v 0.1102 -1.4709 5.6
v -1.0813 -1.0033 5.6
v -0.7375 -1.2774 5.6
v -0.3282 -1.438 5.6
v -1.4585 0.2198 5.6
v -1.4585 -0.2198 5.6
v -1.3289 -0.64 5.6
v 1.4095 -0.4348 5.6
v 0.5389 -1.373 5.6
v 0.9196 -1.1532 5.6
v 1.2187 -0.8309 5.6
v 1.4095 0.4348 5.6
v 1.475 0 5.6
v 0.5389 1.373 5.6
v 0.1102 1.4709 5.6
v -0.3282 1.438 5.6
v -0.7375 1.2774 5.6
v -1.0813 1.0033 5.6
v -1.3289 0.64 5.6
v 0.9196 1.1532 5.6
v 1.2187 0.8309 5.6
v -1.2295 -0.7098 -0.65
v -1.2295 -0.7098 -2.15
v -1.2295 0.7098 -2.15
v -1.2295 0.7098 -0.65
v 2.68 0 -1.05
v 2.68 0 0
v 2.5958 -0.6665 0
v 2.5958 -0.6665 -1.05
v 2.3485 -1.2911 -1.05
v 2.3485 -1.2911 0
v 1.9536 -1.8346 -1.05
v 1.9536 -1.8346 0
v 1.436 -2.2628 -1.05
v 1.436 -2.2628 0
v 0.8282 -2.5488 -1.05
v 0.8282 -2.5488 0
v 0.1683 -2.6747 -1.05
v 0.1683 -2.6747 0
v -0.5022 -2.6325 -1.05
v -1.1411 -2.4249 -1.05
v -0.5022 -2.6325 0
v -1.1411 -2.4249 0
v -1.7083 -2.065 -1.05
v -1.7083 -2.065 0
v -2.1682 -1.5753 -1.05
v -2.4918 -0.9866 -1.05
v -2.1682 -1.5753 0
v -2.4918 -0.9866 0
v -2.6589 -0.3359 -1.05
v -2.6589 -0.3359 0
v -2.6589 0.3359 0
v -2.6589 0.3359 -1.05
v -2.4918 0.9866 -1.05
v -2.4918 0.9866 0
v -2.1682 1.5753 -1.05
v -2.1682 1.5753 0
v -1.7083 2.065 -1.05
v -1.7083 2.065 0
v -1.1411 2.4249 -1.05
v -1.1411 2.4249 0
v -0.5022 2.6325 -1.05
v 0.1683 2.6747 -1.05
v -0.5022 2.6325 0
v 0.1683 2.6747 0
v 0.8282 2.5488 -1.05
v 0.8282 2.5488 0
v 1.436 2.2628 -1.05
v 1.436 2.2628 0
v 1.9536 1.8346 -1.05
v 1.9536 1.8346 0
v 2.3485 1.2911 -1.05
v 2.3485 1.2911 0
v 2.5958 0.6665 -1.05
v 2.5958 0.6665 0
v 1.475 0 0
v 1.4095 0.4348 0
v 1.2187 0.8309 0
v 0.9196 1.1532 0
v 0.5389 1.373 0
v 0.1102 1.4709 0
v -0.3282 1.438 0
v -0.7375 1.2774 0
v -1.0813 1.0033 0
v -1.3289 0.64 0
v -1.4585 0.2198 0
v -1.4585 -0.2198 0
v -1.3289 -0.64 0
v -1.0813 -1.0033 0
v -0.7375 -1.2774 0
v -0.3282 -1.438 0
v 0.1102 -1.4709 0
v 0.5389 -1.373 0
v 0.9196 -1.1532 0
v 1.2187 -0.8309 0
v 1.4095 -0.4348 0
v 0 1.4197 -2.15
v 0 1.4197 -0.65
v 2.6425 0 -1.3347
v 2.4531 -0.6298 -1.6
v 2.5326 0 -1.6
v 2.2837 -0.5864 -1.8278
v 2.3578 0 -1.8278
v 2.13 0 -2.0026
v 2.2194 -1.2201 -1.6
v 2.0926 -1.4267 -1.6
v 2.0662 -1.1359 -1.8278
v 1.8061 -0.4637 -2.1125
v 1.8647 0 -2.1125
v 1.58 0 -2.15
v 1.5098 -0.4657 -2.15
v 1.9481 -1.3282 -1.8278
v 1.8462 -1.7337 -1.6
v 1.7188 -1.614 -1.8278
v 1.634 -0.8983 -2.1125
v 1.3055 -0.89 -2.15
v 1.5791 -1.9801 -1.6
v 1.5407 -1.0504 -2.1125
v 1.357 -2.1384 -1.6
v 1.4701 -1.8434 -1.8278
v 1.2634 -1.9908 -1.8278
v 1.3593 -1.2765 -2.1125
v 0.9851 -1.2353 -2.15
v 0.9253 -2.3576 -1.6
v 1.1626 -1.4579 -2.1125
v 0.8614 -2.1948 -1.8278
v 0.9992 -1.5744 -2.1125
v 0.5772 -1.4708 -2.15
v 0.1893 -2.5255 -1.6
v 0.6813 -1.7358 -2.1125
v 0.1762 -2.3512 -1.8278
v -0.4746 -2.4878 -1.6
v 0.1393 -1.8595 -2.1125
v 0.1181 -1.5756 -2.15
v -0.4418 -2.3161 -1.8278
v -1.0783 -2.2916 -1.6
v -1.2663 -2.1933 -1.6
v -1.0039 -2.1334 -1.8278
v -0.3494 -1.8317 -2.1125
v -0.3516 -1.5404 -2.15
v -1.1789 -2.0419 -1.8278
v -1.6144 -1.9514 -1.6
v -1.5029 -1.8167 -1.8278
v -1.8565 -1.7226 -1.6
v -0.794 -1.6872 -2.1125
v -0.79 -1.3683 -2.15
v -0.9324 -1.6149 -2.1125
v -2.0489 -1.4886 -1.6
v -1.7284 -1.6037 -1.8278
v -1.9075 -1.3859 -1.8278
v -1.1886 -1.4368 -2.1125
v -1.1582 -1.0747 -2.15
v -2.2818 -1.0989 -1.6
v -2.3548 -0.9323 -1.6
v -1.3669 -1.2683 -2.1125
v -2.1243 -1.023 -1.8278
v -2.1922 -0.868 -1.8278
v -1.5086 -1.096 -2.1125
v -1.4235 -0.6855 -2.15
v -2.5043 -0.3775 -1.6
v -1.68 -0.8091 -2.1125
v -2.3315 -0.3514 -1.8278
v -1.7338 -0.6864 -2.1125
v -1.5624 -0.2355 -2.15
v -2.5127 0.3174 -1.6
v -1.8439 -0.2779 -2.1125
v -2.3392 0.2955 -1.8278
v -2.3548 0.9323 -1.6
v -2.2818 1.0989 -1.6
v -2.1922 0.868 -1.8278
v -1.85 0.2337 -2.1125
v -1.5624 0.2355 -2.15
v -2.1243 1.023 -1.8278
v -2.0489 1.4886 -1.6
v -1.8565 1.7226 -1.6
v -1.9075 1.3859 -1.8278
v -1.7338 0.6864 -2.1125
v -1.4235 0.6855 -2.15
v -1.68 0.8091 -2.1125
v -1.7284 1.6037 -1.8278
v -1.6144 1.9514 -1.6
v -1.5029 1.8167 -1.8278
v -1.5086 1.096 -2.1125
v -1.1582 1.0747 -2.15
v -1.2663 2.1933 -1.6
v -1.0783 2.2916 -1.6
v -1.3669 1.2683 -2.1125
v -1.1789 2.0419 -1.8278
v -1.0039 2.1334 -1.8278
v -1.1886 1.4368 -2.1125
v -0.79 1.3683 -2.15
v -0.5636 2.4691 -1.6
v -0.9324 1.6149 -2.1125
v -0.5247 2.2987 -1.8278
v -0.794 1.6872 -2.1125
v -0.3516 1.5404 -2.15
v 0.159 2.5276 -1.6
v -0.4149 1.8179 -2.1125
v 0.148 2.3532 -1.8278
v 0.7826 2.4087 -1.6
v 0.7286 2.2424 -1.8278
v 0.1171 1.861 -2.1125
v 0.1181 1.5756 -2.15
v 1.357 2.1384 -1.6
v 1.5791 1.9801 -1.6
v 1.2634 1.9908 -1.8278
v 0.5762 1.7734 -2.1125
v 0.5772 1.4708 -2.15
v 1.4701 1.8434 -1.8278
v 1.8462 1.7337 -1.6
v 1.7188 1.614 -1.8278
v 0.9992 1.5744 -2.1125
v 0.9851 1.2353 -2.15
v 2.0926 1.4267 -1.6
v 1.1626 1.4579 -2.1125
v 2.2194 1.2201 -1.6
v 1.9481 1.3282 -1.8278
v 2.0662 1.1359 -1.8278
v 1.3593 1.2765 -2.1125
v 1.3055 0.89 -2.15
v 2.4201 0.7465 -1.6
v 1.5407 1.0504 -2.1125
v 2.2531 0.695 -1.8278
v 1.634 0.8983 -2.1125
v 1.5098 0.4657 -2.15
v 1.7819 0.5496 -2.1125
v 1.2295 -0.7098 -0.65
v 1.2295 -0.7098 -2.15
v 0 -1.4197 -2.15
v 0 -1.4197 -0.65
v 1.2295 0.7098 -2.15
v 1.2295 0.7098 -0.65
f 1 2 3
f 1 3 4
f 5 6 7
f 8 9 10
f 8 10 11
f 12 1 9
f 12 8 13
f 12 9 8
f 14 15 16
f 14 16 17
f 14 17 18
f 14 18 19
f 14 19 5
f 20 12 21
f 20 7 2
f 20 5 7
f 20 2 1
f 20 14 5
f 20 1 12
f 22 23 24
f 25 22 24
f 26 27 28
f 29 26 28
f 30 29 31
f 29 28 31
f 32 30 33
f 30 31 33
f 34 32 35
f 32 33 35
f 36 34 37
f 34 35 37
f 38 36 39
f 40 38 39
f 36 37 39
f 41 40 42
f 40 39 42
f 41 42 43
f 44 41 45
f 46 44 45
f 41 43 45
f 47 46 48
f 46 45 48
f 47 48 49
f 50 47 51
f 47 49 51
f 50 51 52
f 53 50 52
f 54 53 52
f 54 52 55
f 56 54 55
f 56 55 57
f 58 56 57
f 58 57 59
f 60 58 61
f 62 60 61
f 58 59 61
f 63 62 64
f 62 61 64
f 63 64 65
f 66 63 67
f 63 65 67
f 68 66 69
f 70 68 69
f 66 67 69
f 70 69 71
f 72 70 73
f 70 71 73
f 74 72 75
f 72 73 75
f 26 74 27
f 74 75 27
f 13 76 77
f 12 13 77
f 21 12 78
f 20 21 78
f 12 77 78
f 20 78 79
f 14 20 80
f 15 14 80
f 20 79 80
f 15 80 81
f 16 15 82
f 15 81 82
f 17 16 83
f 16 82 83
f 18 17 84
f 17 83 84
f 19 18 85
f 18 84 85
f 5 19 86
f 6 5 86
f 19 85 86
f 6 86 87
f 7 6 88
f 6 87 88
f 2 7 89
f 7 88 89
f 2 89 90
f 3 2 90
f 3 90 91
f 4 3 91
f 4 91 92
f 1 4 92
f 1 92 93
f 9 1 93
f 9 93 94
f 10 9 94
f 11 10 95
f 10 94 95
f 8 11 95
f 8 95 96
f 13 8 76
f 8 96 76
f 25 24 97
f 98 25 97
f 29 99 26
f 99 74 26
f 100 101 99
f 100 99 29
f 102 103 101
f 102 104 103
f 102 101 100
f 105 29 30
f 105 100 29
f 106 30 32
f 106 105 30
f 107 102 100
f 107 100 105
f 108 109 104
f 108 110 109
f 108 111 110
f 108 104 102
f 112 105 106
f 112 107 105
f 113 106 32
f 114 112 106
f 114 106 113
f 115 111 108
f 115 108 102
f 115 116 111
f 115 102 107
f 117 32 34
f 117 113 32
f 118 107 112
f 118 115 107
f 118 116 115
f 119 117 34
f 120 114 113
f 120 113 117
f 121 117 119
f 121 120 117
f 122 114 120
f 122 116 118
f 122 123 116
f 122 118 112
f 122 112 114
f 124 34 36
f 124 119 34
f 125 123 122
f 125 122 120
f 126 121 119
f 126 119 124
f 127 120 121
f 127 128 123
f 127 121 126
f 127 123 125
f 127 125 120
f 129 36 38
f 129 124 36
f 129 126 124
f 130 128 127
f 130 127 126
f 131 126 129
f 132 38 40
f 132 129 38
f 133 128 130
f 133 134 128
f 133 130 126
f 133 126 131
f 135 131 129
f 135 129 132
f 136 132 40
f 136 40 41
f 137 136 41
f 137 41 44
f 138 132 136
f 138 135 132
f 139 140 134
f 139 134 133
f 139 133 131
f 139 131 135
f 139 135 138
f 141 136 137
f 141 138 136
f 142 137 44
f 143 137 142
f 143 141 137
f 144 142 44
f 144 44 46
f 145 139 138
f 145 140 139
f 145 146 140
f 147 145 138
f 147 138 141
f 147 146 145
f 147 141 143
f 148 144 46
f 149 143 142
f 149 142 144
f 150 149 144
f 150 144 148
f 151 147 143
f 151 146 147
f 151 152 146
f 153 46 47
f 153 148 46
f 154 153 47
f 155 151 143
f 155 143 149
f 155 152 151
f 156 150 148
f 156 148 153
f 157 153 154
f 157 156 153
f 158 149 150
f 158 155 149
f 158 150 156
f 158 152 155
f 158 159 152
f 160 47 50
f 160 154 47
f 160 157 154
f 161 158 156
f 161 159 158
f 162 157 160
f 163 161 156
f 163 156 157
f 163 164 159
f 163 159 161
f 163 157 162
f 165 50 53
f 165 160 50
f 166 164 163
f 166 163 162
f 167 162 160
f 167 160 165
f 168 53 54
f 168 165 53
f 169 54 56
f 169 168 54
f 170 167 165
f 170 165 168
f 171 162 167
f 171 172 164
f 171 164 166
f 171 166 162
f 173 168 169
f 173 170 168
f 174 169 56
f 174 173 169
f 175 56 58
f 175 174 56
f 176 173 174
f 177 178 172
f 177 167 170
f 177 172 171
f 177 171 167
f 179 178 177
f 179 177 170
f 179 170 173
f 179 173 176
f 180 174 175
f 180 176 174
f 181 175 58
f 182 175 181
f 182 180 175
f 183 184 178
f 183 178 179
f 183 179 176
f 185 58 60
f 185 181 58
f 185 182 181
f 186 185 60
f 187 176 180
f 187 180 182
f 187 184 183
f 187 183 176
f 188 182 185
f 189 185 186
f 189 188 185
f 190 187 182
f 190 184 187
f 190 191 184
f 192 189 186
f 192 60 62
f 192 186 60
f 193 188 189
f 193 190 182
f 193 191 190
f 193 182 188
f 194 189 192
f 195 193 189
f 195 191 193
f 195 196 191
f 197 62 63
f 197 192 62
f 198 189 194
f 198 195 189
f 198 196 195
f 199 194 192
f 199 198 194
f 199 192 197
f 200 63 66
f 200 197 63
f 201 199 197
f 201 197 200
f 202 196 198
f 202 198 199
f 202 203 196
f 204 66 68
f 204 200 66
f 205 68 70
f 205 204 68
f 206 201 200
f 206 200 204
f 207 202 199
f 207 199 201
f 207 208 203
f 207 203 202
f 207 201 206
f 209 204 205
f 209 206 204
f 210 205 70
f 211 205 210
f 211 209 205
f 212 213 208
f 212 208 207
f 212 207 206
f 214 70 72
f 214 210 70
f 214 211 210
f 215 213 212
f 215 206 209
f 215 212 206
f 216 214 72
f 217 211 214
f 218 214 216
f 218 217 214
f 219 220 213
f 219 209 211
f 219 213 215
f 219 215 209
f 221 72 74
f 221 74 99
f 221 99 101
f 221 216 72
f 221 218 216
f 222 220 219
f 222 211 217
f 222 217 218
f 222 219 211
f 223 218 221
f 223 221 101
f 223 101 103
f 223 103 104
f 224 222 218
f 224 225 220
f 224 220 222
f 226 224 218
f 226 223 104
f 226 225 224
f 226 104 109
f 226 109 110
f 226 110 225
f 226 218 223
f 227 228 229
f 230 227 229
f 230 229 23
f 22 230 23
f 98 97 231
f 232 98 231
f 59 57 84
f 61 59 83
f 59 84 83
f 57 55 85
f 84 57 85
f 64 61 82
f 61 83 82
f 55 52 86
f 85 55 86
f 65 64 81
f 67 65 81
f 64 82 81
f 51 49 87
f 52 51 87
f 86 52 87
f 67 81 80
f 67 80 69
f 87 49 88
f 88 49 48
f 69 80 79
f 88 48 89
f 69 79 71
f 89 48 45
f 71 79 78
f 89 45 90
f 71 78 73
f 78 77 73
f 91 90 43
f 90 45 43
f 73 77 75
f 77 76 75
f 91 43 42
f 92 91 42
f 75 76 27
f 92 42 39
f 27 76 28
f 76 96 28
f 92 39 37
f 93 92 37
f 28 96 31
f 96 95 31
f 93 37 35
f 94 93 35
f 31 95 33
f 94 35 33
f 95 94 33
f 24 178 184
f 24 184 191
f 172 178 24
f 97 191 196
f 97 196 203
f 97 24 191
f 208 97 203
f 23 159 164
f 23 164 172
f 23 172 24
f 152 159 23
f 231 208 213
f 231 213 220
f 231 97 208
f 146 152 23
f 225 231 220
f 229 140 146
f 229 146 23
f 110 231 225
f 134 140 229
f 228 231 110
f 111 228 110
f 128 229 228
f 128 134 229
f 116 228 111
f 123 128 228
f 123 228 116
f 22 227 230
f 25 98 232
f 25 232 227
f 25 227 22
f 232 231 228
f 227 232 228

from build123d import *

# Parameters (mm, degrees)
CROQUIS1_R              = 1.475
SALIENTE_EXTRUIR1_DEPTH = 5.6
CROQUIS2_R              = 2.68
SALIENTE_EXTRUIR2_DEPTH = 2.15
CORTAR_EXTRUIR1_DEPTH   = 1.5
REDONDEO1_R             = 1.1


with BuildPart() as part:
    # Croquis1 → Saliente-Extruir1 (new body)
    with BuildSketch(Plane.XY):
        Circle(CROQUIS1_R)
    extrude(amount=SALIENTE_EXTRUIR1_DEPTH)

    # Croquis2 → Saliente-Extruir2 (add)
    with BuildSketch(Plane(origin=(0, 0, 0), x_dir=(-1, 0, 0), z_dir=(0, 0, -1))):
        with Locations(Location((0, 0, 0), (0, 0, 180))):
            Circle(CROQUIS2_R)
    extrude(amount=SALIENTE_EXTRUIR2_DEPTH)

    # Croquis3 → Cortar-Extruir1 (cut)
    with BuildSketch(Plane(origin=(0, 0, -2.15), x_dir=(-1, 0, 0), z_dir=(0, 0, -1))):
        Polygon((0, -1.419699202), (1.229495574, -0.709849601), (1.229495574, 0.709849601), (0, 1.419699202), (-1.229495574, 0.709849601), (-1.229495574, -0.709849601), align=None)
    extrude(amount=-CORTAR_EXTRUIR1_DEPTH, mode=Mode.SUBTRACT)

    # Redondeo1
    redondeo1_edges = [part.edges().sort_by_distance(p)[0] for p in [
        (-2.68, 0, -2.15),
    ]]
    fillet(redondeo1_edges, radius=REDONDEO1_R)


solid = part.part
